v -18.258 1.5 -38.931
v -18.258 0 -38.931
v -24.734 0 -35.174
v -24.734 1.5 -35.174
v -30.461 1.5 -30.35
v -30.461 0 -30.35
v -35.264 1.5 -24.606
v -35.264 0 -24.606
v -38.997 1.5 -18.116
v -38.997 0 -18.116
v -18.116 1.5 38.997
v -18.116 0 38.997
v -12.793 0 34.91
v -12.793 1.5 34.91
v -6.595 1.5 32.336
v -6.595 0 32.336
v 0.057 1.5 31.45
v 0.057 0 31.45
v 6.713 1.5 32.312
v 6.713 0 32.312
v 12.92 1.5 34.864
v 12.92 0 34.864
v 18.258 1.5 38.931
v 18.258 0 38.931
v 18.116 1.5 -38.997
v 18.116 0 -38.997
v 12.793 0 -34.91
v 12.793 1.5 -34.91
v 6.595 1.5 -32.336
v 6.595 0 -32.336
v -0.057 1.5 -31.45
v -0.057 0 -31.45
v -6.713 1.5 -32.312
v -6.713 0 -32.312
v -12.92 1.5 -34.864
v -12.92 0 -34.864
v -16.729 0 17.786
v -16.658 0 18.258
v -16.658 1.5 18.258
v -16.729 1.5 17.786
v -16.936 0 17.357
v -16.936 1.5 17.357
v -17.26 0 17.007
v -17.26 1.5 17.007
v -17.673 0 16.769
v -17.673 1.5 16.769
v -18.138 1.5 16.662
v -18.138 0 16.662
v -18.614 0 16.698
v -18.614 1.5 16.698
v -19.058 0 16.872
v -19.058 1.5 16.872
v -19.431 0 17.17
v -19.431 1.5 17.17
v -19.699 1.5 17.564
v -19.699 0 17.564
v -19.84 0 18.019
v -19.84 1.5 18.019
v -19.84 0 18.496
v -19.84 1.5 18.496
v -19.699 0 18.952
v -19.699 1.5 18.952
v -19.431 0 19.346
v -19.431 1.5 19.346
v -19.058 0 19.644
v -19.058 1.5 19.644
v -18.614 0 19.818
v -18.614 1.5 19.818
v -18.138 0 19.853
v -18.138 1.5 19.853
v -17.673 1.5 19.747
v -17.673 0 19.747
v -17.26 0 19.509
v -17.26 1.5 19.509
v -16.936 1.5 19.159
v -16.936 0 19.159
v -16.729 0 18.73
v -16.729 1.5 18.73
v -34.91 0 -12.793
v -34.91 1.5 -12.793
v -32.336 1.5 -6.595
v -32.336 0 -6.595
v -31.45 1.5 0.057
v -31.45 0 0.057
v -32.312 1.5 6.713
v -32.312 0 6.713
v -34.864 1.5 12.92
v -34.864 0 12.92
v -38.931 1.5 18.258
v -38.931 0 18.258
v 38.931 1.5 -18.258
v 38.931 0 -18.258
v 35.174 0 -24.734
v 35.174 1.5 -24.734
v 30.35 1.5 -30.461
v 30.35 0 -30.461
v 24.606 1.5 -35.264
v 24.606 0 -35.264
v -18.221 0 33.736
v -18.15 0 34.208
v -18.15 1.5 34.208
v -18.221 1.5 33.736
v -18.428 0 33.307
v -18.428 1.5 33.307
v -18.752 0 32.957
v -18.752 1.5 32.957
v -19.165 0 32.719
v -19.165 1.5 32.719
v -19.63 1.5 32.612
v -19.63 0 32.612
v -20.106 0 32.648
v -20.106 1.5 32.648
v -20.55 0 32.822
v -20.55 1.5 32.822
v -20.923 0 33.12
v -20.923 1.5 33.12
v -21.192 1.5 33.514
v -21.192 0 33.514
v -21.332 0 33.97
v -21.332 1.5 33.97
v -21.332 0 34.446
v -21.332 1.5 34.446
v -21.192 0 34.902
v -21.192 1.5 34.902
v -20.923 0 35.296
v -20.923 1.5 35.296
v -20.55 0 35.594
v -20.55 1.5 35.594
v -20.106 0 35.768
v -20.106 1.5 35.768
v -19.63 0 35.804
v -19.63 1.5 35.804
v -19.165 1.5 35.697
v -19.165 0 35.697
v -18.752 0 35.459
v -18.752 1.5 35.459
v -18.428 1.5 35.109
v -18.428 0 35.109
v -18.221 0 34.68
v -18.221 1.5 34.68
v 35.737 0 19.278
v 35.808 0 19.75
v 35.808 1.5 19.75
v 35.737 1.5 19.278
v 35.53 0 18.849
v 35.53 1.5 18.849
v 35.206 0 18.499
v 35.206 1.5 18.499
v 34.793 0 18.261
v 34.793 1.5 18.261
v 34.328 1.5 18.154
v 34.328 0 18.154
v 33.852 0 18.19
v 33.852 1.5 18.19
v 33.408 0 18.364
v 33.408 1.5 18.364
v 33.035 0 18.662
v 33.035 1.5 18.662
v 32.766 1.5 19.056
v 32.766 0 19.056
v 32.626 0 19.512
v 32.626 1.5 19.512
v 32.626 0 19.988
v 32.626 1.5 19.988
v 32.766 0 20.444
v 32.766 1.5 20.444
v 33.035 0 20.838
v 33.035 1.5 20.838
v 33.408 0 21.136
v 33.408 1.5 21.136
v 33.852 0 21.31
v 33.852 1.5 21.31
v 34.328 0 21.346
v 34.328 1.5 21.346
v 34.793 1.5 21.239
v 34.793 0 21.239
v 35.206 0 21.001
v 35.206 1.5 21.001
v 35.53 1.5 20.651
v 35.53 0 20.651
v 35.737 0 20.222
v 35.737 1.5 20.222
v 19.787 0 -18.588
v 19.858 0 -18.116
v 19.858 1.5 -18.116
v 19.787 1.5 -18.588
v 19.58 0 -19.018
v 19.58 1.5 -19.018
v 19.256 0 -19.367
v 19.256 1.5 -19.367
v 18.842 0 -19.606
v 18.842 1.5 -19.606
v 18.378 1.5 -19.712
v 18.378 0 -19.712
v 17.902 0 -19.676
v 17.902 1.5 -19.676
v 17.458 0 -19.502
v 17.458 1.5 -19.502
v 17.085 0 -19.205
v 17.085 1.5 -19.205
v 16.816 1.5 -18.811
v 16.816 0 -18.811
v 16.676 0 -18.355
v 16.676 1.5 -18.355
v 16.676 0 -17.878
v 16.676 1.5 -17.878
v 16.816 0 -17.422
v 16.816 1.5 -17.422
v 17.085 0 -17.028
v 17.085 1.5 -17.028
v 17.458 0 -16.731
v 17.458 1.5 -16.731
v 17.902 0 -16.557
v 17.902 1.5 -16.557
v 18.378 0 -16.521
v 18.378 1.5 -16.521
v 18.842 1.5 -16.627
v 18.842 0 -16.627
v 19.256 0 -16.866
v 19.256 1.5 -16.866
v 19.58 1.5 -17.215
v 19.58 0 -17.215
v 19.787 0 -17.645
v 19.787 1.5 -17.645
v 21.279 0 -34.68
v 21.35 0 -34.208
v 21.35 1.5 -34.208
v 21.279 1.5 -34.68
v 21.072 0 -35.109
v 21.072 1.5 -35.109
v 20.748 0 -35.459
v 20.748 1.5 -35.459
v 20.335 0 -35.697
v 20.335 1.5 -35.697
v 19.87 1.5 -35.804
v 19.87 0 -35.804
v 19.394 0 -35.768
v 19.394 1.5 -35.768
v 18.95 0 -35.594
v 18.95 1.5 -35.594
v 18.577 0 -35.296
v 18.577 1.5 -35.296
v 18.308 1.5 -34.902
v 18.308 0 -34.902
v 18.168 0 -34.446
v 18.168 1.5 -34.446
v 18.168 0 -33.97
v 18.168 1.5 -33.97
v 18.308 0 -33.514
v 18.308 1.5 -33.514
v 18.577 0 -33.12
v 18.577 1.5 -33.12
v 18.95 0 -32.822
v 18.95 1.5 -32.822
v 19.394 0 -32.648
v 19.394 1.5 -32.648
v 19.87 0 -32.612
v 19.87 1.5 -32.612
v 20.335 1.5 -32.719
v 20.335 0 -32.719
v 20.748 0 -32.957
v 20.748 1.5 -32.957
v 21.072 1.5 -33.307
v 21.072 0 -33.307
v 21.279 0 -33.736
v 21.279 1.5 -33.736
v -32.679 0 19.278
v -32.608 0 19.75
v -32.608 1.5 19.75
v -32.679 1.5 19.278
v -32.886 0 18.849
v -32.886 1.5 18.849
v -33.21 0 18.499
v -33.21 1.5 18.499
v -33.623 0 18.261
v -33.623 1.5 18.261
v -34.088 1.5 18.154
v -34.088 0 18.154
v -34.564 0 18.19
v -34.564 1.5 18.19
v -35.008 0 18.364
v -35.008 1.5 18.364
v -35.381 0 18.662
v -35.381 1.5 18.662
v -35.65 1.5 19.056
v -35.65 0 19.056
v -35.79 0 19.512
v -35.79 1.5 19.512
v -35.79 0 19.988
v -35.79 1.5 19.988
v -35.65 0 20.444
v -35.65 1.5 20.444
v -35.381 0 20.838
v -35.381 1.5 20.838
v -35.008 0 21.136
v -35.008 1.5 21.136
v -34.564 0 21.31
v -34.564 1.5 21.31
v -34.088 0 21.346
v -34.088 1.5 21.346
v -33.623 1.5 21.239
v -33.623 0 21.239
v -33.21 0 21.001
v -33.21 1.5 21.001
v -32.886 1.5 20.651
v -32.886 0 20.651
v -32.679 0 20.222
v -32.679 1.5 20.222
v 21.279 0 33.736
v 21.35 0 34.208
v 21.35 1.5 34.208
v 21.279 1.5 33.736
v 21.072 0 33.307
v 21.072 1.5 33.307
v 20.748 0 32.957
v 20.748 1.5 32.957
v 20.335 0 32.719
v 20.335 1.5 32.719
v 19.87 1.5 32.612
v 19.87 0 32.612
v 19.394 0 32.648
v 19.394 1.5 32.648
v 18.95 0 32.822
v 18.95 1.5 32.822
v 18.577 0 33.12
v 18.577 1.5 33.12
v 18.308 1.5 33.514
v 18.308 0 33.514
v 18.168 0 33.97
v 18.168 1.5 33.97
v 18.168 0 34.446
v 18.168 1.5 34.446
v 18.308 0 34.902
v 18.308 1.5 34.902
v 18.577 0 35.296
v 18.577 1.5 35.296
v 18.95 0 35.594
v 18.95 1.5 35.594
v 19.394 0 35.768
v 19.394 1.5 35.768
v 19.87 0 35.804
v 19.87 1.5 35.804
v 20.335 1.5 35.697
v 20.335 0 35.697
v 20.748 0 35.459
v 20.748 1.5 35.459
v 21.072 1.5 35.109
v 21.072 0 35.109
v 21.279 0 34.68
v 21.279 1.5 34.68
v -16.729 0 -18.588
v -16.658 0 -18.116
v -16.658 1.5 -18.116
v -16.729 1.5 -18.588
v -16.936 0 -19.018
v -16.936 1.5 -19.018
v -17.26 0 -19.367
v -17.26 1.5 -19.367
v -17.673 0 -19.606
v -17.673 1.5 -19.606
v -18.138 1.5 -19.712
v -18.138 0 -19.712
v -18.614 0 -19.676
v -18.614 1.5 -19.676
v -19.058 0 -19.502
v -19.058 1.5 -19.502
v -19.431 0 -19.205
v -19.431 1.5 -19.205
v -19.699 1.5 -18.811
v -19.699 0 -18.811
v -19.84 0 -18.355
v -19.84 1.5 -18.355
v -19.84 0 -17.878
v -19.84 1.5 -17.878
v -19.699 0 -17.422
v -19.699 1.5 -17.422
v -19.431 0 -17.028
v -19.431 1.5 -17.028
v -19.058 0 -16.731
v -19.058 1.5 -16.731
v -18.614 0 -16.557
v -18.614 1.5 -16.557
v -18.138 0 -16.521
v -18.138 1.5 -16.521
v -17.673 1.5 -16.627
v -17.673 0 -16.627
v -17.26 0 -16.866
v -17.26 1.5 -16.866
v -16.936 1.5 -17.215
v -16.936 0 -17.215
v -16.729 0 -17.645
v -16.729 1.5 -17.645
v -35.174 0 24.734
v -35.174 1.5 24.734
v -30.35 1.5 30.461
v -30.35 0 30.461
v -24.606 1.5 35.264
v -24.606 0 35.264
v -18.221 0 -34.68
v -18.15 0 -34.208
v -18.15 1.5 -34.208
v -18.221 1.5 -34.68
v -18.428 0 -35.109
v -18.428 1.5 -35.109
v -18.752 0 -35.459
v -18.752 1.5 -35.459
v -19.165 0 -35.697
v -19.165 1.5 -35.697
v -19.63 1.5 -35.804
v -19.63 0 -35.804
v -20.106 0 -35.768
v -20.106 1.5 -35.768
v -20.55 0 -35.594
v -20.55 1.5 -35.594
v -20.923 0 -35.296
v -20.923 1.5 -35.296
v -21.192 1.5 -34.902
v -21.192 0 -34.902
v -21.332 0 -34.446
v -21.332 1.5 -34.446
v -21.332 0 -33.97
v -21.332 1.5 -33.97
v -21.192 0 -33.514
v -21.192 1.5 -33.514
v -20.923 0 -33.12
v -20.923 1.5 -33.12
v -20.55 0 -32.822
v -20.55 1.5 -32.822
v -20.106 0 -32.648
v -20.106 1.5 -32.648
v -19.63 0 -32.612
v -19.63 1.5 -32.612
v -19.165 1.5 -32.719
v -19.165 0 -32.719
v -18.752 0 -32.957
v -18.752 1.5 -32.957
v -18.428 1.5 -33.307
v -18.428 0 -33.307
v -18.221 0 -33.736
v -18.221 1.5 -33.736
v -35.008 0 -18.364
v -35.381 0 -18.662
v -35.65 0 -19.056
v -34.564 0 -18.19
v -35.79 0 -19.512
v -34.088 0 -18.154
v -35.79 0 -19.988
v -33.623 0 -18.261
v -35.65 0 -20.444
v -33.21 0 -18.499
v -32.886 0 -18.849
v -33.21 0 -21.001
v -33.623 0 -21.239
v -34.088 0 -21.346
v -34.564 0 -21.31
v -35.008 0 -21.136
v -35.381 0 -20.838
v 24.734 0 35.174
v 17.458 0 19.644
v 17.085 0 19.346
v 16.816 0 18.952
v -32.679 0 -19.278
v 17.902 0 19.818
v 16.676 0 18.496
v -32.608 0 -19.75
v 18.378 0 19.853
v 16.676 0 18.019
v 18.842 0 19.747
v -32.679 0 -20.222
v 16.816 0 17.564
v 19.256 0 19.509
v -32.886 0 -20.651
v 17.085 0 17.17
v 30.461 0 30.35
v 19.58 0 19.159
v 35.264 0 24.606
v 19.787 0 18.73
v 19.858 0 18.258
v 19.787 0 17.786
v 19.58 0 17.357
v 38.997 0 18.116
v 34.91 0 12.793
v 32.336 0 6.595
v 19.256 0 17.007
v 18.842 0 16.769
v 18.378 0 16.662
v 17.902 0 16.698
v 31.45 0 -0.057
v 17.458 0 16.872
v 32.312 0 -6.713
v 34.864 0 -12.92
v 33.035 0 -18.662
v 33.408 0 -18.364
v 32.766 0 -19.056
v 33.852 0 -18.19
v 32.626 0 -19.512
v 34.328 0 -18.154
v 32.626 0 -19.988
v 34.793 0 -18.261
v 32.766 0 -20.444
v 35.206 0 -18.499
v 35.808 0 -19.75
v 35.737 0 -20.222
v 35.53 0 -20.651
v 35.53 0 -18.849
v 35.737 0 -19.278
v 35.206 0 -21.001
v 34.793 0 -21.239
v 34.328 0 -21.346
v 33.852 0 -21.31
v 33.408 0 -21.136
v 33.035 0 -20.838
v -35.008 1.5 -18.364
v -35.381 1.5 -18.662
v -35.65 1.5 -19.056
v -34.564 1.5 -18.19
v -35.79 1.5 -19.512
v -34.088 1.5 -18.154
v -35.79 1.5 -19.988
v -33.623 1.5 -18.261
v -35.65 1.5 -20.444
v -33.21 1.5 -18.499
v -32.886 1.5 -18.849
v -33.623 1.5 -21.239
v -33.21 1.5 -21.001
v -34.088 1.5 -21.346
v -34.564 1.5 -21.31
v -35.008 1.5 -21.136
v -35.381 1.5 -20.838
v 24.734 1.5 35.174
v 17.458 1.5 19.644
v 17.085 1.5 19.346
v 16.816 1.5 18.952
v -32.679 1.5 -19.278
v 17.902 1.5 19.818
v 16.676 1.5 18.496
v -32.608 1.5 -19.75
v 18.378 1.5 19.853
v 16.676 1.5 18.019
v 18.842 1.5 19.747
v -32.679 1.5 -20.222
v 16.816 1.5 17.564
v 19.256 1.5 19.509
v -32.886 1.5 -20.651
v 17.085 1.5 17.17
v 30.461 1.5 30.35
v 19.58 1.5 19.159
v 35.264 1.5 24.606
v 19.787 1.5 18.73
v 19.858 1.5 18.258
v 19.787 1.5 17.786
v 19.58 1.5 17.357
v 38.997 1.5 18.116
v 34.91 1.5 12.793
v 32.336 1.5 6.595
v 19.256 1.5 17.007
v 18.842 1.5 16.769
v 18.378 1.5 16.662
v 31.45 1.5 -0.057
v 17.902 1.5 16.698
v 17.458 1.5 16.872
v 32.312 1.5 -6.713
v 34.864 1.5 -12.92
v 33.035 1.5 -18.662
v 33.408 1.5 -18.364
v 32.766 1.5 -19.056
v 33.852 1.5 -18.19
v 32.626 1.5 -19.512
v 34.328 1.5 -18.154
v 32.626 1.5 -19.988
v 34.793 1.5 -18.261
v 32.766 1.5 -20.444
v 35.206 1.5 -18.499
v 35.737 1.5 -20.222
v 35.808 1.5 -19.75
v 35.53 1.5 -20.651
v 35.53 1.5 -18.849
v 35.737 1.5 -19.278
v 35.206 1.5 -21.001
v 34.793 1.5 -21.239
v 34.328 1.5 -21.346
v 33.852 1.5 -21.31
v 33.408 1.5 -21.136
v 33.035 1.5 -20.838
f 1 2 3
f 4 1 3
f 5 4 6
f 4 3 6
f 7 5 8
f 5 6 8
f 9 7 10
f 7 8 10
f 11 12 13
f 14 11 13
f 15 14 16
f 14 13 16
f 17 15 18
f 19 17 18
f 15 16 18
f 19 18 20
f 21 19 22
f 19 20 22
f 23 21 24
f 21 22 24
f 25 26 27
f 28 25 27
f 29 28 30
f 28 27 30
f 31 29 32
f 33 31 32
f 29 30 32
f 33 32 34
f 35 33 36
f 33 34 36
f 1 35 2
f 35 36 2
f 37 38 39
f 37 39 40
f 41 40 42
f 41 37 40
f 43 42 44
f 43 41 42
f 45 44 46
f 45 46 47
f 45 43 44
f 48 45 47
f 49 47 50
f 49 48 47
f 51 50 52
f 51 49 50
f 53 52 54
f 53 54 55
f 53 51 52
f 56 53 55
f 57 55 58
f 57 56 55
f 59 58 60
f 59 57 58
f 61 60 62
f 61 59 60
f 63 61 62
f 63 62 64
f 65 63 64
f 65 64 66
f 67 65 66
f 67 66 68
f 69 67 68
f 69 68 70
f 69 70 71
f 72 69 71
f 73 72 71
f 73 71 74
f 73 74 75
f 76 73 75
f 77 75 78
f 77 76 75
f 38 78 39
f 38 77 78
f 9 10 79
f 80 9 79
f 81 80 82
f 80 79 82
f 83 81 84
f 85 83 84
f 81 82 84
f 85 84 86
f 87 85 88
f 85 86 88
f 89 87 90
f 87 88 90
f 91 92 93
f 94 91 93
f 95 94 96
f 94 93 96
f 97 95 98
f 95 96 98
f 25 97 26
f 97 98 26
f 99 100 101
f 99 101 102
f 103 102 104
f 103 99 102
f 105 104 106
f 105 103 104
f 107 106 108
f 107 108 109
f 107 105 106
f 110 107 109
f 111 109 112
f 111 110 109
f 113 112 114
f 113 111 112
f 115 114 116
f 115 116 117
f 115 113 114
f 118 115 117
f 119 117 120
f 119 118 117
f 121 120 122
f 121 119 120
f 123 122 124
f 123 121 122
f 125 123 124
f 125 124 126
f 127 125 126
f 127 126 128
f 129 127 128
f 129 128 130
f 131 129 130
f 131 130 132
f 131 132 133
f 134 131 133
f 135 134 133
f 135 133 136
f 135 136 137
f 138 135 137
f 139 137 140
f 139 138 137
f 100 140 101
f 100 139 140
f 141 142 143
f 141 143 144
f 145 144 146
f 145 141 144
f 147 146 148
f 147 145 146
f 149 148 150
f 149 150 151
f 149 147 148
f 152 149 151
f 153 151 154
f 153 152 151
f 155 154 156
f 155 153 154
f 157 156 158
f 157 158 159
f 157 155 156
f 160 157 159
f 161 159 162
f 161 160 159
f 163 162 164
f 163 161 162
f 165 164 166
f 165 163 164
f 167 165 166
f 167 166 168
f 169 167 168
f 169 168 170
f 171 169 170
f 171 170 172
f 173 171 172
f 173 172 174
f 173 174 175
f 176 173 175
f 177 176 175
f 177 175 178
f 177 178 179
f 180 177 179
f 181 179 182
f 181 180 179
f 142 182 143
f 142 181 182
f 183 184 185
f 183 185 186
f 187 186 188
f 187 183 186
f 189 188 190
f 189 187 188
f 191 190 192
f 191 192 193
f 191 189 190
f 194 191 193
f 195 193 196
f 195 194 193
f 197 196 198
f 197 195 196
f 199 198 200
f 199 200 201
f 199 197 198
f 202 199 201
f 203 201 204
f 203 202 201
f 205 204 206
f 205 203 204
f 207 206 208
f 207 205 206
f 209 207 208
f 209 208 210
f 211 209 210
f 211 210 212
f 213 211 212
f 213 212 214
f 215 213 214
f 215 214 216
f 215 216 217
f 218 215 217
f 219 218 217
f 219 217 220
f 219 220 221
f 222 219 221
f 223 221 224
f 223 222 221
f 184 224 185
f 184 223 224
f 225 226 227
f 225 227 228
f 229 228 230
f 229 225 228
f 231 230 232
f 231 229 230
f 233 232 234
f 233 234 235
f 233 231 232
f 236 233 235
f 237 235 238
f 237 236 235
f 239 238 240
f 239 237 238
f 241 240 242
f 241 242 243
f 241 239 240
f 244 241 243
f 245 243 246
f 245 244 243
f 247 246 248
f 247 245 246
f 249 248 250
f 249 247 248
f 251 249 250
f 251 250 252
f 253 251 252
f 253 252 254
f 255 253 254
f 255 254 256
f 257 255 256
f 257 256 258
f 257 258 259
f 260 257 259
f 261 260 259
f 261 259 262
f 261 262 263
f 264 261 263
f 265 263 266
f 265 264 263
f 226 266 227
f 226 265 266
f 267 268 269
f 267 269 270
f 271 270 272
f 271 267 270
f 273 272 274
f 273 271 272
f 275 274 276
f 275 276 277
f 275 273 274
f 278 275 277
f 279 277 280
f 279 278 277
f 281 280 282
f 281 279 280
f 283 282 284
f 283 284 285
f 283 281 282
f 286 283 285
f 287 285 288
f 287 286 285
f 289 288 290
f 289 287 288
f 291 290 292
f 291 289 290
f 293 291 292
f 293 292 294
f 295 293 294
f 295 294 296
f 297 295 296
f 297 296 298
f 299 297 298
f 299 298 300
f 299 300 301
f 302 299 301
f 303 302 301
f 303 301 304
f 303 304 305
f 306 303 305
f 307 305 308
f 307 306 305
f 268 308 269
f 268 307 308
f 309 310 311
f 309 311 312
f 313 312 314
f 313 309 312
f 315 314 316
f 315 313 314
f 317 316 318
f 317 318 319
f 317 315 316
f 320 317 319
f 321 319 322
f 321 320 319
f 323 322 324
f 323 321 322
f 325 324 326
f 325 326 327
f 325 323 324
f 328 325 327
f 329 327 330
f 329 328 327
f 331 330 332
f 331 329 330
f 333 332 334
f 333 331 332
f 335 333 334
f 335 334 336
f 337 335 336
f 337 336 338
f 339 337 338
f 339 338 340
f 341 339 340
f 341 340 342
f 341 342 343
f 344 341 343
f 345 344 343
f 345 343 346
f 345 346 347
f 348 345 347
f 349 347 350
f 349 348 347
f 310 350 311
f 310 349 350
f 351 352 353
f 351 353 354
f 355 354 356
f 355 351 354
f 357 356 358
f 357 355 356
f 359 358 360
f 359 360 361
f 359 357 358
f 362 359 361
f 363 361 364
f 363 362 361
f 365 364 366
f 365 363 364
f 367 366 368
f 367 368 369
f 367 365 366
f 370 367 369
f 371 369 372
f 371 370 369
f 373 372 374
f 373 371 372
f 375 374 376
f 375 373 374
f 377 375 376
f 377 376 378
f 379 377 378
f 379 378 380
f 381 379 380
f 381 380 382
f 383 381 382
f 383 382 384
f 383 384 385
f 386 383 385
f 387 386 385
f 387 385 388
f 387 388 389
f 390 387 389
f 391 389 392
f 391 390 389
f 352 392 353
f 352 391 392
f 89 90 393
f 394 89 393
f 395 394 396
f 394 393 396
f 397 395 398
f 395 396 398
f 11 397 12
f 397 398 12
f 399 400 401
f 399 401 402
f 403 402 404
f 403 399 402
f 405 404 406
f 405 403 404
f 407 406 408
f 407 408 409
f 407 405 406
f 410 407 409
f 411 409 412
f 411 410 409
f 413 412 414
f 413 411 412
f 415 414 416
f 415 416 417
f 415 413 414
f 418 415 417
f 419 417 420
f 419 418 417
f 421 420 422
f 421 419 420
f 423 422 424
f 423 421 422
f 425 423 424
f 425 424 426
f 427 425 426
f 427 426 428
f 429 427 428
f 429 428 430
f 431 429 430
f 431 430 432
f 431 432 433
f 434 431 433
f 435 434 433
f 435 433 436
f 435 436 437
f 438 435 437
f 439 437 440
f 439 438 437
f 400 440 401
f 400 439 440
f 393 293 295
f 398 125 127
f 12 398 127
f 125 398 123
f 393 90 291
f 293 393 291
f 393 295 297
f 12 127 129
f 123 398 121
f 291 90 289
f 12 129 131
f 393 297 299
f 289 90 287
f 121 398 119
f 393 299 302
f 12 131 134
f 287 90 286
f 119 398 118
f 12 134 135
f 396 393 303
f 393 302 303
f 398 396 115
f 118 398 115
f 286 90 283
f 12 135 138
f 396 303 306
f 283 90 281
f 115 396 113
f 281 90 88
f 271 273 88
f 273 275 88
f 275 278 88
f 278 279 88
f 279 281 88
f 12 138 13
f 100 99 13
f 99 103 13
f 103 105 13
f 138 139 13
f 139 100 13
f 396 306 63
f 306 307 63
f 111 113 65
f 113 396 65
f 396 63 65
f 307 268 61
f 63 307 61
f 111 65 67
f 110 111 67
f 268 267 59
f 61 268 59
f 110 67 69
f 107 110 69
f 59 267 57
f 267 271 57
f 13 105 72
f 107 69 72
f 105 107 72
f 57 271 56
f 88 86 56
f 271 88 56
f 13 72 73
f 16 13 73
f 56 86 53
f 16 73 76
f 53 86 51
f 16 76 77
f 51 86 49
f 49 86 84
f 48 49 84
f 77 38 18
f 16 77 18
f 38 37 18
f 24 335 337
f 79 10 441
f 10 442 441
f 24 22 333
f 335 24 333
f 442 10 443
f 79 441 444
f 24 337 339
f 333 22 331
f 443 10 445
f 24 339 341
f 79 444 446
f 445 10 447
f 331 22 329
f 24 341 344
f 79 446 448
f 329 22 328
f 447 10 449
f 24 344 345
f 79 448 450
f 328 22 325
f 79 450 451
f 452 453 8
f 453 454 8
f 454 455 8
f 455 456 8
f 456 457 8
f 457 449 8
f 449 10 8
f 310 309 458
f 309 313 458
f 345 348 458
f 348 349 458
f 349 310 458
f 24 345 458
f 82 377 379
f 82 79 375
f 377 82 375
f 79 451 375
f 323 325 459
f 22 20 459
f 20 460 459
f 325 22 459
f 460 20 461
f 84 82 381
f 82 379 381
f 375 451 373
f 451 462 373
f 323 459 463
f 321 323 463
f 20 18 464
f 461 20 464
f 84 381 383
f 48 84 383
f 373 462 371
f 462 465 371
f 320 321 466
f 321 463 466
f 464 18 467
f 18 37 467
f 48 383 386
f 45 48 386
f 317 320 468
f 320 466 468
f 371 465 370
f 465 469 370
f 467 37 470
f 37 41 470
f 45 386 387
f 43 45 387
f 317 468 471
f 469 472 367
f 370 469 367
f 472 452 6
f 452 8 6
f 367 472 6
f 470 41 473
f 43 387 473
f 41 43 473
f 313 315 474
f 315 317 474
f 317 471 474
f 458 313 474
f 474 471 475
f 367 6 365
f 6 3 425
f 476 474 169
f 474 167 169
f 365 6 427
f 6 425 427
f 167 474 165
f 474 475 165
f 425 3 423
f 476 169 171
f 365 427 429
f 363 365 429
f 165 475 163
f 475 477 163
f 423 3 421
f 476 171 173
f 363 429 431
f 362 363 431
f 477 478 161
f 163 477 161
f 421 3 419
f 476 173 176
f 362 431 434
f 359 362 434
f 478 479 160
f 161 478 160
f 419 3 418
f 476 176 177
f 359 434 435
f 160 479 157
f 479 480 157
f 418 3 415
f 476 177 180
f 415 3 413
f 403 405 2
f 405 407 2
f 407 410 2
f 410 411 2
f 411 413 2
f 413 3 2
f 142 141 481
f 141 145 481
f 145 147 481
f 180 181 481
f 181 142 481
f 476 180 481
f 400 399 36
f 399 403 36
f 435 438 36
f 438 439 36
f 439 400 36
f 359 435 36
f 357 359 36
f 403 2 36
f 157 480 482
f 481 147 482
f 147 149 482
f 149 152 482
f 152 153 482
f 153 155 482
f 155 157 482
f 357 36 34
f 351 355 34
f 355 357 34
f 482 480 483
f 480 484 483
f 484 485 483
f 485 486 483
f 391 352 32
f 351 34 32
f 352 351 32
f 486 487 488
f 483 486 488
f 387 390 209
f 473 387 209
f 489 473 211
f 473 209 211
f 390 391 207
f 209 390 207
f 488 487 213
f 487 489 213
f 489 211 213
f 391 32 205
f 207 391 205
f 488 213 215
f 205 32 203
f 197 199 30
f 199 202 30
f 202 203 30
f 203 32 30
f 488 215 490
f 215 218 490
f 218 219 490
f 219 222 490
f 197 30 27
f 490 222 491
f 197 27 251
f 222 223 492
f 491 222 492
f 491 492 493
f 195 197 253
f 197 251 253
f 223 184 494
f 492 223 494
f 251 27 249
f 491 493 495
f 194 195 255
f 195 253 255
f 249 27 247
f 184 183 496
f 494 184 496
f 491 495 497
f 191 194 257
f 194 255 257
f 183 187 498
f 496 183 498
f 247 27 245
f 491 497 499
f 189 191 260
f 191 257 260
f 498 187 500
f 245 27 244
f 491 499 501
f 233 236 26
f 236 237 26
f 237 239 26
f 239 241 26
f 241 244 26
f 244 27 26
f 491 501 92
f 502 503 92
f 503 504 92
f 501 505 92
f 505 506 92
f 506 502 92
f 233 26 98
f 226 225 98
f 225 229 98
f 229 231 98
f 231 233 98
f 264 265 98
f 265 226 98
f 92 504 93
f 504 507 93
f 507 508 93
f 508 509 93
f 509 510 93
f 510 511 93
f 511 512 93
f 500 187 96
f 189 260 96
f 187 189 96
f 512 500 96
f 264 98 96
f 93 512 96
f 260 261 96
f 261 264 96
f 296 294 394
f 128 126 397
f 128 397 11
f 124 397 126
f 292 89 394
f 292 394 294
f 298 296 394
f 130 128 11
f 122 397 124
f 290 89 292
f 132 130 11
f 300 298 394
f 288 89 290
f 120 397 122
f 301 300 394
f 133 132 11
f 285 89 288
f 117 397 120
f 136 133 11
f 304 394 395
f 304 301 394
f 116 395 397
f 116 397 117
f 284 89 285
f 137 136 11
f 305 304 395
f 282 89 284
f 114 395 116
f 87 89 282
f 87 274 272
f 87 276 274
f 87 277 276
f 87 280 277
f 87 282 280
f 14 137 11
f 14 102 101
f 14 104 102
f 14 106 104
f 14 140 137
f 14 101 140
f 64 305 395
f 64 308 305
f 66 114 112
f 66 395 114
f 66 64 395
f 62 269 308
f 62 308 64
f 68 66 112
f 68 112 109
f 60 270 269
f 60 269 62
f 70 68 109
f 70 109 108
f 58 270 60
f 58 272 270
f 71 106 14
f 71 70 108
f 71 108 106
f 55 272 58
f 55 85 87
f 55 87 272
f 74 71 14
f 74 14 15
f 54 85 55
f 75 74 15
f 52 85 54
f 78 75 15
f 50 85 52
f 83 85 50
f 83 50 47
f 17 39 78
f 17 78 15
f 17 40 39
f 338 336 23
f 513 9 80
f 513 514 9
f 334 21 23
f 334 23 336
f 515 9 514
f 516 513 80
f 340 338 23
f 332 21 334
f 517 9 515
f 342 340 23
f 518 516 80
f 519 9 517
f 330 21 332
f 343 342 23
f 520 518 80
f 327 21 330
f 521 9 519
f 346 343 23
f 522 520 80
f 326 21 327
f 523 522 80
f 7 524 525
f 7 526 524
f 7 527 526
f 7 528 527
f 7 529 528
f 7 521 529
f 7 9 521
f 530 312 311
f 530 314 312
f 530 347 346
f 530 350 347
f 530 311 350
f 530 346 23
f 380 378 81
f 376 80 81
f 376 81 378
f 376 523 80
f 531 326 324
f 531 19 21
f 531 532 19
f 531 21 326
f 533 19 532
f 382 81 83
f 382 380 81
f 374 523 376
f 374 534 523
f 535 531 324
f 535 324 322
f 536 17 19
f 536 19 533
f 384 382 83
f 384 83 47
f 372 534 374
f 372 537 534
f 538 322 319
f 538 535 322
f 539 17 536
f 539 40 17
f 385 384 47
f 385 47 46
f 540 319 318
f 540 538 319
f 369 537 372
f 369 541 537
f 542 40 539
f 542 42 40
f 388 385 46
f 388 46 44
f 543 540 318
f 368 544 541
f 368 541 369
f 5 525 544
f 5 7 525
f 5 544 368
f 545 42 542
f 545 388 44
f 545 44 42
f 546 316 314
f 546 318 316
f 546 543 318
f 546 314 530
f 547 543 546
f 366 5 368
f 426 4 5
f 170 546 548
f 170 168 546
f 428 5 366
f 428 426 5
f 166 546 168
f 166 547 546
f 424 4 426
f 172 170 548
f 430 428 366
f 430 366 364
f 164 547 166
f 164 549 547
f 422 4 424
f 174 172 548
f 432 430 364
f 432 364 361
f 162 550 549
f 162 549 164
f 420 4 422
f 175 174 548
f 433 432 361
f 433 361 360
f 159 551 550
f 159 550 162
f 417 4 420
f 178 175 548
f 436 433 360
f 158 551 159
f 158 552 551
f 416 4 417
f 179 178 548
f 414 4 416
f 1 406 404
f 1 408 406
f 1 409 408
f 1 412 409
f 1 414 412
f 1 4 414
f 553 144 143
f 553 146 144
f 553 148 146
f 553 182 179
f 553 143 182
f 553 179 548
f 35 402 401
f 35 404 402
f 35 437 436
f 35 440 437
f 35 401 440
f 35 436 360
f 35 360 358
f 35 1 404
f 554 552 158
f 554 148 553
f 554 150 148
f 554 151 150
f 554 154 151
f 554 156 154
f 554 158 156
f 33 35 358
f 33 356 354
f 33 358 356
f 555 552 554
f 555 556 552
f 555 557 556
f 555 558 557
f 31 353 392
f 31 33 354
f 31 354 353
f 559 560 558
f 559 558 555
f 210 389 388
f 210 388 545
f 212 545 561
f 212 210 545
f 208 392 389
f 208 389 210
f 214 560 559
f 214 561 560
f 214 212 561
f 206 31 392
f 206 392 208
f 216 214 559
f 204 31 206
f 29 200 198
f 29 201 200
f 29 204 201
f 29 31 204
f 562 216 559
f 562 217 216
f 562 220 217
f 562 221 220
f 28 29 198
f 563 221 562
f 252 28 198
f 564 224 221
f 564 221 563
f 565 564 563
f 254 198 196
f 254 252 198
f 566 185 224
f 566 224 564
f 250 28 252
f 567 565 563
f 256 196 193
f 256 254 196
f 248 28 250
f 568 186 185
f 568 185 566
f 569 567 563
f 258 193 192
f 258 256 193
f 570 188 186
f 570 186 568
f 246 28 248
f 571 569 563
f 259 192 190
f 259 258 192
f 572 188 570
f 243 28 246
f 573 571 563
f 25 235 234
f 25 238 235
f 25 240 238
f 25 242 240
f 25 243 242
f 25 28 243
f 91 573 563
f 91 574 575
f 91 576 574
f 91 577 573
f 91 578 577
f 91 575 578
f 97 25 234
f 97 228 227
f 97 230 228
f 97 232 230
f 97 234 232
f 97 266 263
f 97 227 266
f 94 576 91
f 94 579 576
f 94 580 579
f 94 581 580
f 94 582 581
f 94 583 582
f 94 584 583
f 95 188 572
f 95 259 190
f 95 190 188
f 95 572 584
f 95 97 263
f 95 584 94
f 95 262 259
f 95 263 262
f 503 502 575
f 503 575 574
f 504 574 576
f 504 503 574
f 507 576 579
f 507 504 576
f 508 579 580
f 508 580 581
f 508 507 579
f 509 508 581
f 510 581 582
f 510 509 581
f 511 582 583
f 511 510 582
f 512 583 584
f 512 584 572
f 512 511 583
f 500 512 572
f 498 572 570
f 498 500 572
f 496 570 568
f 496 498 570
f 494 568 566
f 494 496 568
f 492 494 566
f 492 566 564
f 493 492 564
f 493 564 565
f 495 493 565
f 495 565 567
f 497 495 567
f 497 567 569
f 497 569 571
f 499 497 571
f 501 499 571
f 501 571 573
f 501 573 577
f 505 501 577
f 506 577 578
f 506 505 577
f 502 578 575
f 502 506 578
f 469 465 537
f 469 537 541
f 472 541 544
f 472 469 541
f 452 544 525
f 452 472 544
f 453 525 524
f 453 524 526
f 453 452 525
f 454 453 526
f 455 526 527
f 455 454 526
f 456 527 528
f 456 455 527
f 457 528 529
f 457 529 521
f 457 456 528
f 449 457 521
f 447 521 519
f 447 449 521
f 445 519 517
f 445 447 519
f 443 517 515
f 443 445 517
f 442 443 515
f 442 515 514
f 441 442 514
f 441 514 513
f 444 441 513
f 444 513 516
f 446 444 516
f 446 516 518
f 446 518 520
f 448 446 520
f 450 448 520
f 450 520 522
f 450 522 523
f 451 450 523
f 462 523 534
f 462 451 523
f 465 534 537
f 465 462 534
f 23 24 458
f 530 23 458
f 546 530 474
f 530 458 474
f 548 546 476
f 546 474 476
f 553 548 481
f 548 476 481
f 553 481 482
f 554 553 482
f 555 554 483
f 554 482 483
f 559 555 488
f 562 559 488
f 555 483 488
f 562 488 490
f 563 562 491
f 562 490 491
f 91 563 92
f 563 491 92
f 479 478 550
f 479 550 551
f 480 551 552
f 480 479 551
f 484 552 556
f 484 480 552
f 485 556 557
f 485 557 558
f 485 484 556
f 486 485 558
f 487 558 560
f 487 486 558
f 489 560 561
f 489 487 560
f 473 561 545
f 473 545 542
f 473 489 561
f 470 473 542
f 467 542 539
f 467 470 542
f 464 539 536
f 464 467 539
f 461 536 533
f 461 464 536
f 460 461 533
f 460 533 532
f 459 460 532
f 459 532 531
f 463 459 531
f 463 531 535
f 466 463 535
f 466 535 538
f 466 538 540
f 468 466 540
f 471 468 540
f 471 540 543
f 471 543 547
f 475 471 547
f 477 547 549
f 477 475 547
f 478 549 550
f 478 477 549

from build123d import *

# Parameters (mm, degrees)
SKETCH2_R           = 1.6
BOSS_EXTRUDE1_DEPTH = 1.5


with BuildPart() as part:
    # Sketch2 → Boss-Extrude1 (new body)
    with BuildSketch(Plane(origin=(0, 0, 0), x_dir=(1, 0, 0), z_dir=(0, 1, 0))):
        with BuildLine():
            ThreePointArc((-18.257935671, 38.931321388), (-30.460746389, 30.350336562), (-38.99736345, 18.116446781))
            ThreePointArc((-38.99736345, 18.116446781), (-31.450297137, -0.057101793), (-38.931321388, -18.257935671))
            ThreePointArc((-38.931321388, -18.257935671), (-30.350336562, -30.460746389), (-18.116446781, -38.99736345))
            ThreePointArc((-18.116446781, -38.99736345), (0.057101793, -31.450297137), (18.257935671, -38.931321388))
            ThreePointArc((18.257935671, -38.931321388), (30.460746389, -30.350336562), (38.99736345, -18.116446781))
            ThreePointArc((38.99736345, -18.116446781), (31.450297137, 0.057101793), (38.931321388, 18.257935671))
            ThreePointArc((38.931321388, 18.257935671), (30.350336562, 30.460746389), (18.116446781, 38.99736345))
            ThreePointArc((18.116446781, 38.99736345), (-0.057101793, 31.450297137), (-18.257935671, 38.931321388))
        make_face()
        with Locations((19.75, 34.208003449)):
            Circle(SKETCH2_R, mode=Mode.SUBTRACT)
        with Locations((34.208003449, 19.75)):
            Circle(SKETCH2_R, mode=Mode.SUBTRACT)
        with Locations((19.75, -34.208003449)):
            Circle(SKETCH2_R, mode=Mode.SUBTRACT)
        with Locations((34.208003449, -19.75)):
            Circle(SKETCH2_R, mode=Mode.SUBTRACT)
        with Locations((-34.208003449, -19.75)):
            Circle(SKETCH2_R, mode=Mode.SUBTRACT)
        with Locations((-19.75, -34.208003449)):
            Circle(SKETCH2_R, mode=Mode.SUBTRACT)
        with Locations((-19.75, 34.208003449)):
            Circle(SKETCH2_R, mode=Mode.SUBTRACT)
        with Locations((-34.208003449, 19.75)):
            Circle(SKETCH2_R, mode=Mode.SUBTRACT)
        with Locations((-18.257935671, 18.116446781)):
            Circle(SKETCH2_R, mode=Mode.SUBTRACT)
        with Locations((18.257935671, 18.116446781)):
            Circle(SKETCH2_R, mode=Mode.SUBTRACT)
        with Locations((-18.257935671, -18.257935671)):
            Circle(SKETCH2_R, mode=Mode.SUBTRACT)
        with Locations((18.257935671, -18.257935671)):
            Circle(SKETCH2_R, mode=Mode.SUBTRACT)
    extrude(amount=BOSS_EXTRUDE1_DEPTH)


solid = part.part
